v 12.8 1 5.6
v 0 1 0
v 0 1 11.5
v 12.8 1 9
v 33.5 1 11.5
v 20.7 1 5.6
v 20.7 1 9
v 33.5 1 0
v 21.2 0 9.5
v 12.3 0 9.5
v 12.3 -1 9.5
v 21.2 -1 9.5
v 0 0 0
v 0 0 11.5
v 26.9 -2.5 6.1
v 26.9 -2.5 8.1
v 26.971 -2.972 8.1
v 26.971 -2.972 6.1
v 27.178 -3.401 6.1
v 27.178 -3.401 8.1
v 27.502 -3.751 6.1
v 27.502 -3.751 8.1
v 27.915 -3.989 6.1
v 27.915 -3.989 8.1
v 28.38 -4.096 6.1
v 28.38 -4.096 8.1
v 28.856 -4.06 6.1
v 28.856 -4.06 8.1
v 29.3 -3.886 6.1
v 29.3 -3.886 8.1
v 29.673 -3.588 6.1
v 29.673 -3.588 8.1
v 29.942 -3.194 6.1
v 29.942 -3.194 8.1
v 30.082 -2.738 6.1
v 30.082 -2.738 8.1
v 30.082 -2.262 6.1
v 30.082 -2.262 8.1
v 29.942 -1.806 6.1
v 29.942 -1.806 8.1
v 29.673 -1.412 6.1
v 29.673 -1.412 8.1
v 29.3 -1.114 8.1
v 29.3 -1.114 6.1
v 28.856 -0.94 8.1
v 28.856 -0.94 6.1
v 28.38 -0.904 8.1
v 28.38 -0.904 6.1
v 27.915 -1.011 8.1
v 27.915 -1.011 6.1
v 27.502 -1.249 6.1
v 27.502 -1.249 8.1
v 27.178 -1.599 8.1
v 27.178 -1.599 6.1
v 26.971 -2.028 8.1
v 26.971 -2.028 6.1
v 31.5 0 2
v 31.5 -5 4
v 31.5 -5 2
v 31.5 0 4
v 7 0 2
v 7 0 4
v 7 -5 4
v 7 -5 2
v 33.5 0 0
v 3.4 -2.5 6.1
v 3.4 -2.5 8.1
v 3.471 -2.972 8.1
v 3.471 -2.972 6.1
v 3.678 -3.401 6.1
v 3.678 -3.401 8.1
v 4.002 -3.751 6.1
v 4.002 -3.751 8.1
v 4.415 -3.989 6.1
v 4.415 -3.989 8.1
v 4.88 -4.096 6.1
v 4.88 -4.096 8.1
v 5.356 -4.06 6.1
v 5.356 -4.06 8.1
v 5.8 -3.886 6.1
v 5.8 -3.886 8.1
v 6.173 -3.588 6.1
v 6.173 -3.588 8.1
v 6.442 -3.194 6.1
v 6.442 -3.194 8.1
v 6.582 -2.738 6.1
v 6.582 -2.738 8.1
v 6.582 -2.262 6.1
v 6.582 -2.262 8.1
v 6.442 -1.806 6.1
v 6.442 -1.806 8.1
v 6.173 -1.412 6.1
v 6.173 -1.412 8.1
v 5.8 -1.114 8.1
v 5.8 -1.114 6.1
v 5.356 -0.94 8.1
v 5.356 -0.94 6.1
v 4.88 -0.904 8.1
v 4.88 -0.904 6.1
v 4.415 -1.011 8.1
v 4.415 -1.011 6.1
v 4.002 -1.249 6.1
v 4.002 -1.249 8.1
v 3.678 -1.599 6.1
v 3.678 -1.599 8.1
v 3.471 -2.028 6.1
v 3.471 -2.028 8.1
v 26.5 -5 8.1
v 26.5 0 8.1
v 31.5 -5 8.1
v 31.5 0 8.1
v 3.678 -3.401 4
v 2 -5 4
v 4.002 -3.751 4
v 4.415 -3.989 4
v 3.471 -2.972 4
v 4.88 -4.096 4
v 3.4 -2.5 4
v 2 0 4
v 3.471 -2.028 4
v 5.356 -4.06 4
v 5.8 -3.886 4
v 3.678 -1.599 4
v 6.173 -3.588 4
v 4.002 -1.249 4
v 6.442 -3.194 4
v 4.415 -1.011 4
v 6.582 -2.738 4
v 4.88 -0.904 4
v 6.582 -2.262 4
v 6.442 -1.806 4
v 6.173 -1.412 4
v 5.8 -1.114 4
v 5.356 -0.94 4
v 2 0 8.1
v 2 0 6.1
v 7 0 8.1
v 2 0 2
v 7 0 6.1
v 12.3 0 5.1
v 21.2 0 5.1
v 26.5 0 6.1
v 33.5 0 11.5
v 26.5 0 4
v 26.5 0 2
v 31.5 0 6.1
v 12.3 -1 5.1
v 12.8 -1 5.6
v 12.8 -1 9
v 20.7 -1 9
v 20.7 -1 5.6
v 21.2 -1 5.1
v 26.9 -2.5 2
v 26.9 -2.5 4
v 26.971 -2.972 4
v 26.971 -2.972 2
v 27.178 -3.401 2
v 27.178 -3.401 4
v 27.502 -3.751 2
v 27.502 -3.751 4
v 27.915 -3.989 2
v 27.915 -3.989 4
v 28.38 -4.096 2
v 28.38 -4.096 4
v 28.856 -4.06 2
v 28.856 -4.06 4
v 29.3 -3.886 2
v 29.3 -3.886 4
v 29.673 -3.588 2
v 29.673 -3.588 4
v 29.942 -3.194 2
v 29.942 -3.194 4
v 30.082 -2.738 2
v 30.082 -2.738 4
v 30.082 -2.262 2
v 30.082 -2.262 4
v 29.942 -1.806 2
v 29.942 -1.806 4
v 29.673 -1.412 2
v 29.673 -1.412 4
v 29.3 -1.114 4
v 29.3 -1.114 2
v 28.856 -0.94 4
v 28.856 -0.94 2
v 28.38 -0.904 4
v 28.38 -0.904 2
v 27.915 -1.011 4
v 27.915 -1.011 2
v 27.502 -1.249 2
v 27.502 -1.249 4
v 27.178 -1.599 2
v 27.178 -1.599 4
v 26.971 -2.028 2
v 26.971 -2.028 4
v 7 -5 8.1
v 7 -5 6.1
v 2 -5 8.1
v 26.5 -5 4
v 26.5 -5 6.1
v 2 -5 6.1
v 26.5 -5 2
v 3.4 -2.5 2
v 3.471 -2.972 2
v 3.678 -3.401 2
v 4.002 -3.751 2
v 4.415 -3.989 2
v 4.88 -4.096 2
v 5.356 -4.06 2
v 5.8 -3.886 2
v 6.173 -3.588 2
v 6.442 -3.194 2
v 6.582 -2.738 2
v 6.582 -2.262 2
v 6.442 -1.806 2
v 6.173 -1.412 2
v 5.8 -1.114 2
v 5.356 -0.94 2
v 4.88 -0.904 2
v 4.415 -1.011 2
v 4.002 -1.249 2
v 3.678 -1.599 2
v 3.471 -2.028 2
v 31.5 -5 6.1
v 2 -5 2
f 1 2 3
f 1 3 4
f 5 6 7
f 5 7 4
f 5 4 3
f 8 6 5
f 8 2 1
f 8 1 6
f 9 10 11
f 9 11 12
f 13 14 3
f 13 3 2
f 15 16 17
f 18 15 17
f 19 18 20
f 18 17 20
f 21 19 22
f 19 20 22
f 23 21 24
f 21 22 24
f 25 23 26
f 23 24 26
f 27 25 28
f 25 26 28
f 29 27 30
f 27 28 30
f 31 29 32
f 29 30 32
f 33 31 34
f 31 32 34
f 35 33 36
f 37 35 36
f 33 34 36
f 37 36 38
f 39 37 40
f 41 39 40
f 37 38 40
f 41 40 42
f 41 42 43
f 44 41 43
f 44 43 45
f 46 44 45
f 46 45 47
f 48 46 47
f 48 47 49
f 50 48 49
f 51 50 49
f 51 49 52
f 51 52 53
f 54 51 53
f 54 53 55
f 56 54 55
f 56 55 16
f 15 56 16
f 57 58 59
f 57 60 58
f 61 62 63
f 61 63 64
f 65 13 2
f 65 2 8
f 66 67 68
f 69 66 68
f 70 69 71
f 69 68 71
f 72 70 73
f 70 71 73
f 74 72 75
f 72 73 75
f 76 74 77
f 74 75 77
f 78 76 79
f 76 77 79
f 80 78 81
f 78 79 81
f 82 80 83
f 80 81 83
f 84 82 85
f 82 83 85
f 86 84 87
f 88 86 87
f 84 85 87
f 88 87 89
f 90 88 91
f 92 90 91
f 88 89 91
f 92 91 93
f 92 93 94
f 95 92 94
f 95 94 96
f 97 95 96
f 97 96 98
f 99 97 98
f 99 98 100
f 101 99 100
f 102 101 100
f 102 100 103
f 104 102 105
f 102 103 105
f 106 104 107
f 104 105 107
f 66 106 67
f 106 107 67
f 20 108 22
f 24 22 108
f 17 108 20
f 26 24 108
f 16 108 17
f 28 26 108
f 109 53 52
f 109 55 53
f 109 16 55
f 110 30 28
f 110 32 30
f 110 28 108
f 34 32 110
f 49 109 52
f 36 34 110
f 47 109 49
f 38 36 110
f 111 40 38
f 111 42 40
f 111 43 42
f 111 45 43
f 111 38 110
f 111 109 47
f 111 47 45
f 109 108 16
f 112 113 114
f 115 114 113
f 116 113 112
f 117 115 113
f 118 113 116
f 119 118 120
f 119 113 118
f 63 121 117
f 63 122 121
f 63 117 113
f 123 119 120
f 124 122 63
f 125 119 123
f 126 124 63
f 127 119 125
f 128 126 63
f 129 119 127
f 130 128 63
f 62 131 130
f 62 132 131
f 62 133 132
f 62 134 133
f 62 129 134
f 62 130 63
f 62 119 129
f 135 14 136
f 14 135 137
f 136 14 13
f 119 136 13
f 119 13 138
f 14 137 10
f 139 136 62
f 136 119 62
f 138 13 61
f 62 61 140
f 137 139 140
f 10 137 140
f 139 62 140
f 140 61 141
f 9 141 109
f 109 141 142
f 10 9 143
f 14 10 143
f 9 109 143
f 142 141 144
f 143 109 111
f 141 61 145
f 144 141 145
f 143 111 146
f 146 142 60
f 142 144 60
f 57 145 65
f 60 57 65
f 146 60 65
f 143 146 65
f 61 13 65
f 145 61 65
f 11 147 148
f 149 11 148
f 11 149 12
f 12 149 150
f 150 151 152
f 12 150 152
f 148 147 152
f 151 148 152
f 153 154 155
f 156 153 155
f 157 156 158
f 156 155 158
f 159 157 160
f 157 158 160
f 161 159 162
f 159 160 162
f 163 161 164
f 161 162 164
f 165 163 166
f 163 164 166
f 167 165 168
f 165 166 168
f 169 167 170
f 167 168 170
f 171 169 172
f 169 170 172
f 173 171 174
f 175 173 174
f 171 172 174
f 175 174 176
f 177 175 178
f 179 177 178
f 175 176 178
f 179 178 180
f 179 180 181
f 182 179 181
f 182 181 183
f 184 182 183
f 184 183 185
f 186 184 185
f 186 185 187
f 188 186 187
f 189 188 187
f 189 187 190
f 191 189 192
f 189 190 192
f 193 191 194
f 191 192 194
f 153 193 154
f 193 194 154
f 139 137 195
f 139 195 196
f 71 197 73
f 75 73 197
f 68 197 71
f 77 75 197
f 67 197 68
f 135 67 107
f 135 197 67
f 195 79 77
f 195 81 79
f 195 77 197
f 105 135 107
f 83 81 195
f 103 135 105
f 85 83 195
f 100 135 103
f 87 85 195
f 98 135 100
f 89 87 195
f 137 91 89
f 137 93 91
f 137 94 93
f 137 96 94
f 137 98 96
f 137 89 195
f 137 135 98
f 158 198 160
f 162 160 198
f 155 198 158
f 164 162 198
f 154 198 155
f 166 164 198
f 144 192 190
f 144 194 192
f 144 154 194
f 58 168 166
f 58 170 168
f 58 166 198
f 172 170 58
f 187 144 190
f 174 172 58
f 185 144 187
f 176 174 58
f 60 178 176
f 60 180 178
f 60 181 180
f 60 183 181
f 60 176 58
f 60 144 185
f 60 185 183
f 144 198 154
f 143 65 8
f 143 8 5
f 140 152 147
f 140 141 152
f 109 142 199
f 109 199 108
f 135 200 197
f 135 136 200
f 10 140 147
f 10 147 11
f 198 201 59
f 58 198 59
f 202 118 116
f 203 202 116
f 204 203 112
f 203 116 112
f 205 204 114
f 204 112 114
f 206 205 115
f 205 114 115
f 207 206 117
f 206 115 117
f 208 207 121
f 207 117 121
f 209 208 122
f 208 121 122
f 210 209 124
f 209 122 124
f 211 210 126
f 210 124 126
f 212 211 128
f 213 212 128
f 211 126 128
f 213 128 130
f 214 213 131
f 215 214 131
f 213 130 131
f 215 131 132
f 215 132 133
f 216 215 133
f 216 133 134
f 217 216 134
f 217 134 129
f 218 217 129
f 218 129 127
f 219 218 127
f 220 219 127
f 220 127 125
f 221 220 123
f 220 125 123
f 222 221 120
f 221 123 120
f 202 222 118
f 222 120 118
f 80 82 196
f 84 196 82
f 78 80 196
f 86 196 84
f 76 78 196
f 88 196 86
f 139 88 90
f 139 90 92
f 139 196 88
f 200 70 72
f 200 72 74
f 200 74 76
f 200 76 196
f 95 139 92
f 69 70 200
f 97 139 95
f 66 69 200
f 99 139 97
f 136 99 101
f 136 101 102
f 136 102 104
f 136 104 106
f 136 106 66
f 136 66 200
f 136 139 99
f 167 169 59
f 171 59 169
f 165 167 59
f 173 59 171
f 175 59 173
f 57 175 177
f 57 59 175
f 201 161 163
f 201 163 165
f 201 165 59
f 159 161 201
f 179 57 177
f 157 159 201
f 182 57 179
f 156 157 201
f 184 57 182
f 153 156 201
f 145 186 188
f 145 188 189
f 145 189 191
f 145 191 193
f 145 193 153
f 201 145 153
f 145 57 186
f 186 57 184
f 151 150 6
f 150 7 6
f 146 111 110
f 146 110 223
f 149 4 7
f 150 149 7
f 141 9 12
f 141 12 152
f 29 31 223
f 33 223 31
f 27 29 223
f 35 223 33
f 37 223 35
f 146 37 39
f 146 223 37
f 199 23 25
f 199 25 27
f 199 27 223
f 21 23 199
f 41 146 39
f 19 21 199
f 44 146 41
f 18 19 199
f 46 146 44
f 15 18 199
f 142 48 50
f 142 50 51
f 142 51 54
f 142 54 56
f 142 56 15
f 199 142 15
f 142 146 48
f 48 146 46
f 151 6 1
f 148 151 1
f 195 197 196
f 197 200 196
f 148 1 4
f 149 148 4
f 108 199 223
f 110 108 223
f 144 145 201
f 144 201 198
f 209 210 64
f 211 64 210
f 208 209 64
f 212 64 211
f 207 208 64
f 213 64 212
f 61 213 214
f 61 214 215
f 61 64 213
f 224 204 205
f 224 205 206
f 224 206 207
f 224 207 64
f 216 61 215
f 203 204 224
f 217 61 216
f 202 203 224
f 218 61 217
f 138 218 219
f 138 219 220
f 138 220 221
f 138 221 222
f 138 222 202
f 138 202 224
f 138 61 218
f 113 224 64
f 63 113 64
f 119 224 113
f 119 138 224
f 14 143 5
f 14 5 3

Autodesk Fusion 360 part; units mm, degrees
sketch "Sketch1" plane through (0, 0, 0) normal (0, 1, 0) x (1, 0, 0)
  line L0 (0, 0) -> (33.5, 0)
  line L1 (33.5, 0) -> (33.5, -11.5)
  line L2 (33.5, -11.5) -> (0, -11.5)
  line L3 (0, -11.5) -> (0, 0)
  line L4 (12.8, -9) -> (20.7, -9)
  line L5 (20.7, -9) -> (20.7, -5.6)
  line L6 (20.7, -5.6) -> (12.8, -5.6)
  line L7 (12.8, -5.6) -> (12.8, -9)
  line L8 (12.3, -9.5) -> (21.2, -9.5)
  line L9 (21.2, -9.5) -> (21.2, -5.1)
  line L10 (21.2, -5.1) -> (12.3, -5.1)
  line L11 (12.3, -5.1) -> (12.3, -9.5)
  line L12 (3.5, -5.8) -> (6.5, -5.8)
  line L13 (6.5, -5.8) -> (6.5, -4.3)
  line L14 (6.5, -4.3) -> (3.5, -4.3)
  line L15 (3.5, -4.3) -> (3.5, -5.8)
  line L16 (27, -5.8) -> (30, -5.8)
  line L17 (30, -5.8) -> (30, -4.3)
  line L18 (30, -4.3) -> (27, -4.3)
  line L19 (27, -4.3) -> (27, -5.8)
  line L20 (2, -8.1) -> (7, -8.1)
  line L21 (7, -8.1) -> (7, -6.1)
  line L22 (7, -6.1) -> (2, -6.1)
  line L23 (2, -6.1) -> (2, -8.1)
  line L24 (2, -4) -> (7, -4)
  line L25 (7, -4) -> (7, -2)
  line L26 (7, -2) -> (2, -2)
  line L27 (2, -2) -> (2, -4)
  line L28 (26.5, -8.1) -> (31.5, -8.1)
  line L29 (31.5, -8.1) -> (31.5, -6.1)
  line L30 (31.5, -6.1) -> (26.5, -6.1)
  line L31 (26.5, -6.1) -> (26.5, -8.1)
  line L32 (26.5, -4) -> (31.5, -4)
  line L33 (31.5, -4) -> (31.5, -2)
  line L34 (31.5, -2) -> (26.5, -2)
  line L35 (26.5, -2) -> (26.5, -4)
  dimension "d1" = 7.9
  dimension "d2" = 3.4
  dimension "d3" = 8.9
  dimension "d4" = 4.4
  dimension "d5" = 0.5
  dimension "d6" = 0.5
  dimension "d7" = 3
  dimension "d8" = 1.5
  dimension "d9" = 3
  dimension "d10" = 1.5
  dimension "d12" = 0.2
  dimension "d14" = 0.2
  dimension "d15" = 5
  dimension "d16" = 2
  dimension "d17" = 0.3
  dimension "d18" = 1.5
  dimension "d19" = 5
  dimension "d20" = 2
  dimension "d21" = 1.5
  dimension "d22" = 0.3
  dimension "d23" = 5
  dimension "d24" = 2
  dimension "d25" = 5
  dimension "d26" = 2
  dimension "d27" = 0.5
  dimension "d28" = 0.3
  dimension "d29" = 0.3
  dimension "d30" = 0.5
  dimension "d31" = 2
  dimension "d32" = 2
  dimension "d33" = 2
  dimension "d34" = 2
  dimension "d49" = 20.5
  dimension "d50" = 6.3
extrude "Extrude1" add sketch "Sketch1" along normal blind 1 contours L0 L1 L2 L3 | L8 L9 L10 L11 | L12 L13 L14 L15 | L16 L17 L18 L19 | L20 L21 L22 L23 | L24 L25 L26 L27 | L28 L29 L30 L31 | L32 L33 L34 L35
extrude "Extrude2" add sketch "Sketch1" against normal blind 1 contours L8 L9 L10 L11
extrude "Extrude3" add sketch "Sketch1" against normal blind 5 contours L20 L21 L22 L23 | L24 L25 L26 L27 | L28 L29 L30 L31 | L32 L33 L34 L35
sketch "Sketch2" plane through (0, 0, 8.1) normal (0, 0, 1) x (-1, 0, 0)
  line L0 (-7, 0) -> (-2, 0)
  line L1 (-2, 0) -> (-2, 5)
  line L2 (-2, 5) -> (-7, 5)
  line L3 (-7, 5) -> (-7, 0)
  circle A0 centre (-5, 2.5) radius 1.6
  line L4 (-33.5, 0) -> (0, 0)
  circle A1 centre (-28.5, 2.5) radius 1.6
  line L5 (-31.5, 0) -> (-31.5, 5)
  line L6 (-26.5, 0) -> (-26.5, 5)
  dimension "d41" = 3.2
  dimension "d43" = 2.5
  dimension "d44" = 3.2
  dimension "d46" = 2.5
  dimension "d51" = 2
  dimension "d52" = 2
extrude "Extrude4" cut sketch "Sketch2" against normal blind 8 contours A0 | A1
equation "d50 = 5.8 mm + 0.5 mm"
